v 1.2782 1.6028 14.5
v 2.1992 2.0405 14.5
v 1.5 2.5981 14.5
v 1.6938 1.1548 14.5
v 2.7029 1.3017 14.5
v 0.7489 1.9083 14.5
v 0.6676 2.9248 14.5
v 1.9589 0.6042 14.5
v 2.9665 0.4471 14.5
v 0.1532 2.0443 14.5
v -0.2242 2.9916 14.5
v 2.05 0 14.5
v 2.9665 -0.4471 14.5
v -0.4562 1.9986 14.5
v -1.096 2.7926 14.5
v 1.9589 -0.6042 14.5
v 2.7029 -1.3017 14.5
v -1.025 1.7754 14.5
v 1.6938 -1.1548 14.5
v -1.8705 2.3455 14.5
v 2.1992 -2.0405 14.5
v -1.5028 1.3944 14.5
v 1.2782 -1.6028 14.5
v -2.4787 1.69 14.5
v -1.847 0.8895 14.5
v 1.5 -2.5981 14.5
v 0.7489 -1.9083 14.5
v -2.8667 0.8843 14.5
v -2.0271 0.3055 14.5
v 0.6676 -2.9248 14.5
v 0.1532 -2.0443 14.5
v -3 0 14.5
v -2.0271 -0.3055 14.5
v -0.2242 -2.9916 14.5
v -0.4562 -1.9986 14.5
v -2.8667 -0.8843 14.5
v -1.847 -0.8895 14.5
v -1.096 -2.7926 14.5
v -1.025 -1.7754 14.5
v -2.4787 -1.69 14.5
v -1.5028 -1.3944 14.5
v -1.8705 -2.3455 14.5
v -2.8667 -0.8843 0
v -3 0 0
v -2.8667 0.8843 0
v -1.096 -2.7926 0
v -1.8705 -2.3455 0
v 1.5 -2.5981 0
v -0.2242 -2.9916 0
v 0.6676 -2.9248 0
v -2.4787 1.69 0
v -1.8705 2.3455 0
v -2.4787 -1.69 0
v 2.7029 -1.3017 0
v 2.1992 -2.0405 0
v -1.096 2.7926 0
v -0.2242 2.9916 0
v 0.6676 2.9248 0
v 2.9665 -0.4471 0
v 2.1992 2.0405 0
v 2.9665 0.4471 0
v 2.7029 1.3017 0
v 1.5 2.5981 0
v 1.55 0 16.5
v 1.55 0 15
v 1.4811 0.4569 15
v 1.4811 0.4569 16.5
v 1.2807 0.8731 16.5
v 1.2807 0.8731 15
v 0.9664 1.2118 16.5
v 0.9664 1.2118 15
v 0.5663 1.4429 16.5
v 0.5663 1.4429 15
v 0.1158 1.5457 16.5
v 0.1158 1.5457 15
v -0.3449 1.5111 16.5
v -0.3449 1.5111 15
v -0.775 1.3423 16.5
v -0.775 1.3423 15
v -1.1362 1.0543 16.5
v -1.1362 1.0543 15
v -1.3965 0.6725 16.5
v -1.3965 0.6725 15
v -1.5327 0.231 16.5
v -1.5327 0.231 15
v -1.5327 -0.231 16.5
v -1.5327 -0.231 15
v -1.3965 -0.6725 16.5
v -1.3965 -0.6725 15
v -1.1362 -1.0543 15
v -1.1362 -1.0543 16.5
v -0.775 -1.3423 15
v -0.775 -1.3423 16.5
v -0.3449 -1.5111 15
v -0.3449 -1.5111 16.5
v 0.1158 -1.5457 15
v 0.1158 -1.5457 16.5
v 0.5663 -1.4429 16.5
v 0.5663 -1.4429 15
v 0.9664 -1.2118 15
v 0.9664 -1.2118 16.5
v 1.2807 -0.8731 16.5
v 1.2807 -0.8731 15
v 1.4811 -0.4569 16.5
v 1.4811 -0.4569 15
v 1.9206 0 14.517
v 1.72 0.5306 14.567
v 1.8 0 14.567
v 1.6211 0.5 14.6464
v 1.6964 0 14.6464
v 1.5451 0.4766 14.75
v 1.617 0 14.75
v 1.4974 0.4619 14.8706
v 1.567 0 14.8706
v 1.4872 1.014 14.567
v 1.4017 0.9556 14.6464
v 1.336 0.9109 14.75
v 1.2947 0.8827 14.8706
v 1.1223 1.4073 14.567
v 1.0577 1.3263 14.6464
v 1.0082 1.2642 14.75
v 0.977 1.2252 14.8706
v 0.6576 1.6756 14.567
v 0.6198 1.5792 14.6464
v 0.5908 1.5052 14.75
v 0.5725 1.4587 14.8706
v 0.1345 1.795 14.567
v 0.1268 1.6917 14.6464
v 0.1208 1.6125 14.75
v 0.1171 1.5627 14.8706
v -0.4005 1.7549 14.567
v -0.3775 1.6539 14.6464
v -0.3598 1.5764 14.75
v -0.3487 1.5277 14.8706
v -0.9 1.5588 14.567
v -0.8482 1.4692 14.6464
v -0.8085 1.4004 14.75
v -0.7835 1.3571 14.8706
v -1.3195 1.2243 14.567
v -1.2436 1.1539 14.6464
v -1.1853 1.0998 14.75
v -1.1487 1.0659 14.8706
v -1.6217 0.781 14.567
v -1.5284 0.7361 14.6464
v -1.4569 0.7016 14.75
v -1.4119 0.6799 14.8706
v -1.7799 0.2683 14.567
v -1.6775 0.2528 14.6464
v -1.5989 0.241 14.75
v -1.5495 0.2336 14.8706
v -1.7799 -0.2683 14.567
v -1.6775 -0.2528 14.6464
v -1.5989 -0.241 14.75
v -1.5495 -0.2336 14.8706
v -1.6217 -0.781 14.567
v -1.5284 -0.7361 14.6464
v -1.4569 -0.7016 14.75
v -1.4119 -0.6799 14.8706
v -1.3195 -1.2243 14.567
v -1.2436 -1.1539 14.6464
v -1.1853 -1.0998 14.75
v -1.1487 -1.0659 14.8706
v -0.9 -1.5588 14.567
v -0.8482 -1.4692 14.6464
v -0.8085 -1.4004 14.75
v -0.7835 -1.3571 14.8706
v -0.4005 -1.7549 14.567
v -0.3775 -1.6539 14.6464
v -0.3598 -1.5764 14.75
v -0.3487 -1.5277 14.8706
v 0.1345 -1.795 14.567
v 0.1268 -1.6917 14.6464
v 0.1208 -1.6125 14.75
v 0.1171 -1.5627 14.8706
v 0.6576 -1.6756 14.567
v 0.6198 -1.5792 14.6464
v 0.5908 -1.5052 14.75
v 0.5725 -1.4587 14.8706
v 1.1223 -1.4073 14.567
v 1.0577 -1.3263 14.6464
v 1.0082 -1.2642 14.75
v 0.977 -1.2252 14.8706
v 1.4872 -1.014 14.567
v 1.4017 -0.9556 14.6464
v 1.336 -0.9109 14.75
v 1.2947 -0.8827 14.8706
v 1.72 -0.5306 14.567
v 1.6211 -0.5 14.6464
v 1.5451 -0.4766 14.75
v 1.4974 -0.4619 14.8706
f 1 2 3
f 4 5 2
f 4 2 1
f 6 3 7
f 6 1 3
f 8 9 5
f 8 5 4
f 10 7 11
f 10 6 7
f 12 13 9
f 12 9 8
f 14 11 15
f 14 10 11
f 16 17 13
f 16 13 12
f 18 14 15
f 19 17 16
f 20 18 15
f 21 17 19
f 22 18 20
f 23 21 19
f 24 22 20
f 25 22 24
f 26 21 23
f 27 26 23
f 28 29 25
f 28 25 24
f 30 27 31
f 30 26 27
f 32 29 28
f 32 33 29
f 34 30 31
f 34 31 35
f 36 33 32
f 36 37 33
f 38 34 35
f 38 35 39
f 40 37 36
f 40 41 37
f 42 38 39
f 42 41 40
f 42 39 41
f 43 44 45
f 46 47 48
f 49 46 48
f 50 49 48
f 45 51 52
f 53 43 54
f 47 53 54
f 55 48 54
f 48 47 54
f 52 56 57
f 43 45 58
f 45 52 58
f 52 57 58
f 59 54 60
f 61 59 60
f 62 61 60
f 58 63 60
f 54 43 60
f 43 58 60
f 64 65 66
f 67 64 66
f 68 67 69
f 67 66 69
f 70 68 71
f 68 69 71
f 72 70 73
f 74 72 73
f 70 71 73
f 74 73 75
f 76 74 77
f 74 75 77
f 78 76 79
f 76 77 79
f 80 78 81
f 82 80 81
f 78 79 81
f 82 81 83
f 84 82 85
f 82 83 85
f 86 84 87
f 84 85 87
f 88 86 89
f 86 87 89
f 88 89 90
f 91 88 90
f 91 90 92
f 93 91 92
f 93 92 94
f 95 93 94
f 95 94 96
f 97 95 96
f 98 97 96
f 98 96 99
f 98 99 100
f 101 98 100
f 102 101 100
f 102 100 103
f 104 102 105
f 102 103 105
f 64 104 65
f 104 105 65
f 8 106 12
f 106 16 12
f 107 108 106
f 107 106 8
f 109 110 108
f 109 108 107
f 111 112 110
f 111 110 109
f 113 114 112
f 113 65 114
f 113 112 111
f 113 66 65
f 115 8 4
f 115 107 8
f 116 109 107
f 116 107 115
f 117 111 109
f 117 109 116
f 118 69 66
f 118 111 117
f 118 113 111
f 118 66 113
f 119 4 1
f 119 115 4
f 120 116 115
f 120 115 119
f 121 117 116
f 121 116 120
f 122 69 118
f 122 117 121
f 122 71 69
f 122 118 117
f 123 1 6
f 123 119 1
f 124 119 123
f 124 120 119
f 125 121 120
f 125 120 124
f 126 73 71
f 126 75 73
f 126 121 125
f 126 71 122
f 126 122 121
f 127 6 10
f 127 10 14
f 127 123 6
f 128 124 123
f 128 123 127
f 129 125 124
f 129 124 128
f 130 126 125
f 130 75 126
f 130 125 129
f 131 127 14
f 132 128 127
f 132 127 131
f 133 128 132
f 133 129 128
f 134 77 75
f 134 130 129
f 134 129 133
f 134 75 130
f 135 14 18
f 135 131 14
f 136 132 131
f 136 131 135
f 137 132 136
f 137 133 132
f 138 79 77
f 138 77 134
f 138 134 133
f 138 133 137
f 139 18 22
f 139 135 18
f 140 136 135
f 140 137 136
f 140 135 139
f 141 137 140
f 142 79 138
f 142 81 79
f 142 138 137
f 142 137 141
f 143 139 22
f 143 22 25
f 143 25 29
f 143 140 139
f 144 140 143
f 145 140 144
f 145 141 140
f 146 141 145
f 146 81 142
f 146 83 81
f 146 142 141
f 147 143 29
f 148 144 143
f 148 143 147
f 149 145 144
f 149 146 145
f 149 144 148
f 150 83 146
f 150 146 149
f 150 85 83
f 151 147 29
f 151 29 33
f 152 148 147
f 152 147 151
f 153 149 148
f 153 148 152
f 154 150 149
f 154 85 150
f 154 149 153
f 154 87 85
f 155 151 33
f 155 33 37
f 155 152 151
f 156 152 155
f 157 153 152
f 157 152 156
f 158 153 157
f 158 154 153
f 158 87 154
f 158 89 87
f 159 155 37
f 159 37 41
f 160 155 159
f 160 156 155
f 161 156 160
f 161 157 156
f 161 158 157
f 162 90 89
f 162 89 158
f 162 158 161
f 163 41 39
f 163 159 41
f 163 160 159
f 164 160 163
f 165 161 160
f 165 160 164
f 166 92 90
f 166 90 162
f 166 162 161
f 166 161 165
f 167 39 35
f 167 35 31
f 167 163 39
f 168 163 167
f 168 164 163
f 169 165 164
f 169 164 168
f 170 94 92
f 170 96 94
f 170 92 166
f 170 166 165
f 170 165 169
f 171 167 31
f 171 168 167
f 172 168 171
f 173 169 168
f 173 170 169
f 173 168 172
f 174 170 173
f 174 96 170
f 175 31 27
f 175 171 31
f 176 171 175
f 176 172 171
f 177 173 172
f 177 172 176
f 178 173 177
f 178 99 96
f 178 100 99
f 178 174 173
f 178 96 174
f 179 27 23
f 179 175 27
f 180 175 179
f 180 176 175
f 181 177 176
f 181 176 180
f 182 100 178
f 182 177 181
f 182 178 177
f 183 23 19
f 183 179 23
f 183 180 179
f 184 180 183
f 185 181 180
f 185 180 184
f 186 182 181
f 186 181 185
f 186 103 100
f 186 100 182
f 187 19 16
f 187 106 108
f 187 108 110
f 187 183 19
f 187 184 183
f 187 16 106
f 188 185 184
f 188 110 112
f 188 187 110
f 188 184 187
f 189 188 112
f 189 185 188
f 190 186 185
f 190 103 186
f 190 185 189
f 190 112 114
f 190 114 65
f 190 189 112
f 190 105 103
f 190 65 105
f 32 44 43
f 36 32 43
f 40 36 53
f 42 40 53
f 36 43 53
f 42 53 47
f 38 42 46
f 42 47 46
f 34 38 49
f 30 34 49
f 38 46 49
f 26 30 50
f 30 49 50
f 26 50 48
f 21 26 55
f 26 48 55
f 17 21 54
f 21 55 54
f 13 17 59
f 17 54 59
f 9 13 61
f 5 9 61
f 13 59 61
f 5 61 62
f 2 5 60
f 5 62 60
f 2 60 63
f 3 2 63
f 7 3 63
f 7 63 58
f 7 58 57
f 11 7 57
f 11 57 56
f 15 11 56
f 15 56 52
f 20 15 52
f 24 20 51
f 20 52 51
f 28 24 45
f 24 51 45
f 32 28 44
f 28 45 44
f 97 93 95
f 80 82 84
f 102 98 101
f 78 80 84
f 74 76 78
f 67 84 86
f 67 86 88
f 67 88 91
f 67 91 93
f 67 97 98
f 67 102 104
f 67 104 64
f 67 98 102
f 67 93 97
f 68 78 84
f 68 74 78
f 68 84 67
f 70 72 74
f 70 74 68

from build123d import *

# Parameters (mm, degrees)
SKETCH1_R           = 3
SKETCH1_R_2         = 1.55
BOSS_EXTRUDE1_DEPTH = 14.5
BOSS_EXTRUDE2_START = 14.5
SKETCH1_3_R         = 1.55
BOSS_EXTRUDE2_DEPTH = 2
FILLET1_R           = 0.5


with BuildPart() as part:
    # Sketch1 → Boss-Extrude1 (new body)
    # profile 1 of 2: a face of its own
    with BuildSketch(Plane.XY):
        with Locations(Location((0, 0, 0), (0, 0, 180))):
            Circle(SKETCH1_R)
        Circle(SKETCH1_R_2, mode=Mode.SUBTRACT)
    # profile 2 of 2: a face of its own
    with BuildSketch(Plane.XY):
        Circle(SKETCH1_R_2)
    extrude(amount=BOSS_EXTRUDE1_DEPTH)

    # Sketch1<3> → Boss-Extrude2 (add)
    with BuildSketch(Plane.XY.offset(BOSS_EXTRUDE2_START)):
        Circle(SKETCH1_3_R)
    extrude(amount=BOSS_EXTRUDE2_DEPTH)

    # Fillet1
    fillet1_edges = [part.edges().sort_by_distance(p)[0] for p in [
        (-1.55, 0, 14.5),
    ]]
    fillet(fillet1_edges, radius=FILLET1_R)


solid = part.part
